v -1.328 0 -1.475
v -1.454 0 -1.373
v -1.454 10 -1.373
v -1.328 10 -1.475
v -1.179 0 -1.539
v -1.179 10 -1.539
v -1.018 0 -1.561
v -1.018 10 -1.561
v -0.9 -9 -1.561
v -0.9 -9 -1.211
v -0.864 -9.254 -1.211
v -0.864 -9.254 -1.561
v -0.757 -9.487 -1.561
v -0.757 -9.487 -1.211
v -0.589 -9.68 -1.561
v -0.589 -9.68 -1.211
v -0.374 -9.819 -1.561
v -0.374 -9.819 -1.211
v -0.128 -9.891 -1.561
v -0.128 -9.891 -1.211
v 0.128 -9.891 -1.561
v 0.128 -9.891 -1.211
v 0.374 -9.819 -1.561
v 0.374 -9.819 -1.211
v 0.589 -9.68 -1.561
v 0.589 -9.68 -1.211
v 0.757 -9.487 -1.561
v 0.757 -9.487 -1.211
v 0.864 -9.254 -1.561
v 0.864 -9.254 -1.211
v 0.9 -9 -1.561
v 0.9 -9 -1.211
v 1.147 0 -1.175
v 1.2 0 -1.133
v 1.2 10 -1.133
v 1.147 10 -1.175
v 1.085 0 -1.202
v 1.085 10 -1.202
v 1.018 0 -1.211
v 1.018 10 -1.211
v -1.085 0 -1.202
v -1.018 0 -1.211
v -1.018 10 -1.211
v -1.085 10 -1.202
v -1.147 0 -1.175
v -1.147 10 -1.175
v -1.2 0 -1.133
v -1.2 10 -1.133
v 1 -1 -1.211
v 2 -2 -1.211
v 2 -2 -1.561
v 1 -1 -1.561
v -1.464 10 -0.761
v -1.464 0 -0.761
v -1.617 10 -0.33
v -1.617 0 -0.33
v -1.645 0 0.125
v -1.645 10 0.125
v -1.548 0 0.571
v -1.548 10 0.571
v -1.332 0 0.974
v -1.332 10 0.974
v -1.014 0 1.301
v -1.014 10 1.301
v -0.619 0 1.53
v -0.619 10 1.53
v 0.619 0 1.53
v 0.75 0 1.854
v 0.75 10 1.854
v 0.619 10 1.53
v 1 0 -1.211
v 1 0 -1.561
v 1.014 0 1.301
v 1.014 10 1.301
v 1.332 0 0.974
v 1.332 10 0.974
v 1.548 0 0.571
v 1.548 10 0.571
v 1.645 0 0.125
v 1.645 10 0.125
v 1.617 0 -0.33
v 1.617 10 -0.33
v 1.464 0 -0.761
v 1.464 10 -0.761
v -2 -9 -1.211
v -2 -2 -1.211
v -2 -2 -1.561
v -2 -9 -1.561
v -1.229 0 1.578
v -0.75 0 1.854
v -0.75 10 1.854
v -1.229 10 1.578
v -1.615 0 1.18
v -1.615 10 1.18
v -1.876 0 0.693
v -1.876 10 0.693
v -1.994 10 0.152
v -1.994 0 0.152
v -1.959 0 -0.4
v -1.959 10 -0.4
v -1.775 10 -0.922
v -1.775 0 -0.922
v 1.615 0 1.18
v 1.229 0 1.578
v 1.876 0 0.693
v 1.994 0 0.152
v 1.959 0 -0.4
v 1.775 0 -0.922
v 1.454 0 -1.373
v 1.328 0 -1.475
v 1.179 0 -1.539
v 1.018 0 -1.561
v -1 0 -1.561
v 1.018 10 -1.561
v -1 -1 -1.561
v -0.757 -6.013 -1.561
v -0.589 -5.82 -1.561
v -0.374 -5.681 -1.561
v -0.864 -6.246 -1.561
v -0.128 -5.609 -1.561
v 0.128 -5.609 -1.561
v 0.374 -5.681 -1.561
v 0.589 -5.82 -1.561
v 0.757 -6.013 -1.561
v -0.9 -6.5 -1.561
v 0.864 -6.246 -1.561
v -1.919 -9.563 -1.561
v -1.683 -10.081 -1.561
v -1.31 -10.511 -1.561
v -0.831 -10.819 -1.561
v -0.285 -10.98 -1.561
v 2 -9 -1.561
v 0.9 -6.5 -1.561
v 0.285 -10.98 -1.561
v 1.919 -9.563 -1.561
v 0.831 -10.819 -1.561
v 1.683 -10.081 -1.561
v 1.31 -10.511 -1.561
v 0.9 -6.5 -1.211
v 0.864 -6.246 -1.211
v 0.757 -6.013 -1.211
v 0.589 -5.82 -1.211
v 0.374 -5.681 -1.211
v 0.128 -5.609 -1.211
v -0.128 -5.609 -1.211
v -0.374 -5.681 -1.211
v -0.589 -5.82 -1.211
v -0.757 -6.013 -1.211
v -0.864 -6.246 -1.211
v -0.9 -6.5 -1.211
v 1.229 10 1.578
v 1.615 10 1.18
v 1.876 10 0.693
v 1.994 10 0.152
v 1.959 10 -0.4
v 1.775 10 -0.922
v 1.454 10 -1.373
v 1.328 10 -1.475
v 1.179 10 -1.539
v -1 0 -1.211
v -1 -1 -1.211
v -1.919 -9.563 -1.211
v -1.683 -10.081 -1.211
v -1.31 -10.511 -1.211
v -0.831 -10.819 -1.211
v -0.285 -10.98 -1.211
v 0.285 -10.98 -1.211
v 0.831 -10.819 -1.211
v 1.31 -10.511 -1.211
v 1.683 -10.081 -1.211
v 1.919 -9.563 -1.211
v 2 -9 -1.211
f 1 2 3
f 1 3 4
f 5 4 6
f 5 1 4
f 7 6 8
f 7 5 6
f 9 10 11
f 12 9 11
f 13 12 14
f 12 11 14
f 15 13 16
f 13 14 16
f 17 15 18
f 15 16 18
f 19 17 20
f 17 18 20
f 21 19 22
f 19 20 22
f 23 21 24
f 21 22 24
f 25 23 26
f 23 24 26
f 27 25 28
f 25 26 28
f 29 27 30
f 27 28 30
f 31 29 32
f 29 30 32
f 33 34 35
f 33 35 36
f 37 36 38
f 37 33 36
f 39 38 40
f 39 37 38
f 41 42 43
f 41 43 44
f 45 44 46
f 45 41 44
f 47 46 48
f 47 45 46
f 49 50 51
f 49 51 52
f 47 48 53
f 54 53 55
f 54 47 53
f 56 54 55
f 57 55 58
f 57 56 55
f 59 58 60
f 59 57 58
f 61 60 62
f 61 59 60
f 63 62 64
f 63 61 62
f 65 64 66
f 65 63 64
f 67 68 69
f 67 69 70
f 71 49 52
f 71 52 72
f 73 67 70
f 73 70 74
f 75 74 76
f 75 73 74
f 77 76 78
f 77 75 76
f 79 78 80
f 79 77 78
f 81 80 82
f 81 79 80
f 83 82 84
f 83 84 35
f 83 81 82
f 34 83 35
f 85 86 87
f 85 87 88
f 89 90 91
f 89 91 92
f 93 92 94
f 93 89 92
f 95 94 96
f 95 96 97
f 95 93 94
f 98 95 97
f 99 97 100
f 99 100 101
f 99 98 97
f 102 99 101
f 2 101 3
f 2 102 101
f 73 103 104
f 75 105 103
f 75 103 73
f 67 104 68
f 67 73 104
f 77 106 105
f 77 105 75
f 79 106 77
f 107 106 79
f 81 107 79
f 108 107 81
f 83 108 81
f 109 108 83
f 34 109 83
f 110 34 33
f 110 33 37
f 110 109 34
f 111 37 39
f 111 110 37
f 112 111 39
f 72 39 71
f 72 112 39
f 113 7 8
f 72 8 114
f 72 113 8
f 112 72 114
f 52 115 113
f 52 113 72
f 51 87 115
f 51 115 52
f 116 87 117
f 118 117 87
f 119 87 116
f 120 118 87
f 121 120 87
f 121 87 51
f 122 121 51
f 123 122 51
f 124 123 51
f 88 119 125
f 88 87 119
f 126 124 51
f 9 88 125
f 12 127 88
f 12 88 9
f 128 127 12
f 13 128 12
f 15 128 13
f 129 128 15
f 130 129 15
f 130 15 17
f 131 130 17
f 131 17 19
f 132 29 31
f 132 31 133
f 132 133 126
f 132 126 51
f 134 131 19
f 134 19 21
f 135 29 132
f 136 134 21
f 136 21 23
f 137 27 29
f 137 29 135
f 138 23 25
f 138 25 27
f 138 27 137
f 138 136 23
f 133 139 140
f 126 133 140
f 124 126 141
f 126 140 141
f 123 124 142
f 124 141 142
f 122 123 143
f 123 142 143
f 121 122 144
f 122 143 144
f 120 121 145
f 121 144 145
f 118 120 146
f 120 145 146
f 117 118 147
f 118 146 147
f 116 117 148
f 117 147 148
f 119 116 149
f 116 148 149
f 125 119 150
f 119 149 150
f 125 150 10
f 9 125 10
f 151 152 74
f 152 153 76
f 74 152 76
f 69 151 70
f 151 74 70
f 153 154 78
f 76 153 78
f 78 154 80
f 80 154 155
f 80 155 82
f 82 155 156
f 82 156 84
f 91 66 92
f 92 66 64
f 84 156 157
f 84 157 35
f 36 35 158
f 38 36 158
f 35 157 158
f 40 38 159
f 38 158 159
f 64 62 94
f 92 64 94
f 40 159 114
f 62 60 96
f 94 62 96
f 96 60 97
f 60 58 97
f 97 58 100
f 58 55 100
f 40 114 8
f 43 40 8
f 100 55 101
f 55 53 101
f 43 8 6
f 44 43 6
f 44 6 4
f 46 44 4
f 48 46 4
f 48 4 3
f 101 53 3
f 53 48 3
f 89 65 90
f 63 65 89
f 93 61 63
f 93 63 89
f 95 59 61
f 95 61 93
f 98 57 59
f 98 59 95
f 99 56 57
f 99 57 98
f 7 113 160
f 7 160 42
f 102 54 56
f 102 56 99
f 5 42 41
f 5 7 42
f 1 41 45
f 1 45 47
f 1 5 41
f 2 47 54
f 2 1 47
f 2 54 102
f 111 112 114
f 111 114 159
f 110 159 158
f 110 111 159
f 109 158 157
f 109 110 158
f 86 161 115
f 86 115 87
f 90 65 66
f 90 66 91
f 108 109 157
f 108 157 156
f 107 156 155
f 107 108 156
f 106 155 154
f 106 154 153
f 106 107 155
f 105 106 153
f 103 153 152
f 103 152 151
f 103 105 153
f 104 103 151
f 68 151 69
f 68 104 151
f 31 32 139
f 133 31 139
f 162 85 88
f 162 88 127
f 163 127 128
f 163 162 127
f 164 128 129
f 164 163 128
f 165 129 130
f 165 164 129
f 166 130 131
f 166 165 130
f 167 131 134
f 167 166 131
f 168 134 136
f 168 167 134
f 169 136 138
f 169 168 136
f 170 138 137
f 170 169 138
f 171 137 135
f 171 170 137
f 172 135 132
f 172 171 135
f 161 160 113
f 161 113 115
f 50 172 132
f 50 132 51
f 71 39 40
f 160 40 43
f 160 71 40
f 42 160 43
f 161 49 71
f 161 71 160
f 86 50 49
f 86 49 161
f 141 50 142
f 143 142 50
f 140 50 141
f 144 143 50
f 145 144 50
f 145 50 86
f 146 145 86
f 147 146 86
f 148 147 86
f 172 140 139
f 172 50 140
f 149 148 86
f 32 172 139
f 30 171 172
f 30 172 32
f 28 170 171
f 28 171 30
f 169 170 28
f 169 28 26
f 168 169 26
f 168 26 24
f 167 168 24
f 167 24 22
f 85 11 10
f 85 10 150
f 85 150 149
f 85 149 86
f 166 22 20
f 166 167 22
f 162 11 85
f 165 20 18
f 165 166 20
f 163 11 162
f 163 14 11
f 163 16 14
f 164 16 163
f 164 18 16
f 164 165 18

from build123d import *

# Parameters (mm, degrees)
EXTRUDE_THIN1_DEPTH = 10
EXTRUDE1_DEPTH      = 0.35


with BuildPart() as part:
    # Sketch1 → Extrude-Thin1 (new body)
    with BuildSketch(Plane(origin=(0, 0, 0), x_dir=(1, 0, 0), z_dir=(0, 1, 0))):
        with BuildLine():
            ThreePointArc((-0.75, -1.854049622), (-1.954040628, -0.426292414), (-1.454057939, 1.373213571))
            ThreePointArc((-1.454057939, 1.373213571), (-1.255350091, 1.512238811), (-1.017840557, 1.5612495))
            Line((-1.017840557, 1.5612495), (1.017840557, 1.5612495))
            ThreePointArc((1.017840557, 1.5612495), (1.255350091, 1.512238811), (1.454057939, 1.373213571))
            ThreePointArc((1.454057939, 1.373213571), (1.954040628, -0.426292414), (0.75, -1.854049622))
            Line((0.75, -1.854049622), (0.61875, -1.529590938))
            ThreePointArc((0.61875, -1.529590938), (1.612083519, -0.351691242), (1.199597799, 1.132901196))
            ThreePointArc((1.199597799, 1.132901196), (1.116802863, 1.190828379), (1.017840557, 1.2112495))
            Line((1.017840557, 1.2112495), (-1.017840557, 1.2112495))
            ThreePointArc((-1.017840557, 1.2112495), (-1.116802863, 1.190828379), (-1.199597799, 1.132901196))
            ThreePointArc((-1.199597799, 1.132901196), (-1.612083519, -0.351691242), (-0.61875, -1.529590938))
            Line((-0.61875, -1.529590938), (-0.75, -1.854049622))
        make_face()
    extrude(amount=EXTRUDE_THIN1_DEPTH)

    # Sketch2 → Extrude1 (add)
    with BuildSketch(Plane.XY.offset(-1.2112495)):
        with BuildLine():
            Line((-1, 0), (-1, -1))
            Line((-1, -1), (-2, -2))
            Line((-2, -2), (-2, -9))
            ThreePointArc((-2, -9), (0, -11), (2, -9))
            Line((2, -9), (2, -2))
            Line((2, -2), (1, -1))
            Line((1, -1), (1, 0))
            Line((1, 0), (-1, 0))
        make_face()
        with BuildLine():
            Line((0.9, -9), (0.9, -6.5))
            ThreePointArc((0.9, -6.5), (0, -5.6), (-0.9, -6.5))
            Line((-0.9, -6.5), (-0.9, -9))
            ThreePointArc((-0.9, -9), (0, -9.9), (0.9, -9))
        make_face(mode=Mode.SUBTRACT)
    extrude(amount=-EXTRUDE1_DEPTH)


solid = part.part
